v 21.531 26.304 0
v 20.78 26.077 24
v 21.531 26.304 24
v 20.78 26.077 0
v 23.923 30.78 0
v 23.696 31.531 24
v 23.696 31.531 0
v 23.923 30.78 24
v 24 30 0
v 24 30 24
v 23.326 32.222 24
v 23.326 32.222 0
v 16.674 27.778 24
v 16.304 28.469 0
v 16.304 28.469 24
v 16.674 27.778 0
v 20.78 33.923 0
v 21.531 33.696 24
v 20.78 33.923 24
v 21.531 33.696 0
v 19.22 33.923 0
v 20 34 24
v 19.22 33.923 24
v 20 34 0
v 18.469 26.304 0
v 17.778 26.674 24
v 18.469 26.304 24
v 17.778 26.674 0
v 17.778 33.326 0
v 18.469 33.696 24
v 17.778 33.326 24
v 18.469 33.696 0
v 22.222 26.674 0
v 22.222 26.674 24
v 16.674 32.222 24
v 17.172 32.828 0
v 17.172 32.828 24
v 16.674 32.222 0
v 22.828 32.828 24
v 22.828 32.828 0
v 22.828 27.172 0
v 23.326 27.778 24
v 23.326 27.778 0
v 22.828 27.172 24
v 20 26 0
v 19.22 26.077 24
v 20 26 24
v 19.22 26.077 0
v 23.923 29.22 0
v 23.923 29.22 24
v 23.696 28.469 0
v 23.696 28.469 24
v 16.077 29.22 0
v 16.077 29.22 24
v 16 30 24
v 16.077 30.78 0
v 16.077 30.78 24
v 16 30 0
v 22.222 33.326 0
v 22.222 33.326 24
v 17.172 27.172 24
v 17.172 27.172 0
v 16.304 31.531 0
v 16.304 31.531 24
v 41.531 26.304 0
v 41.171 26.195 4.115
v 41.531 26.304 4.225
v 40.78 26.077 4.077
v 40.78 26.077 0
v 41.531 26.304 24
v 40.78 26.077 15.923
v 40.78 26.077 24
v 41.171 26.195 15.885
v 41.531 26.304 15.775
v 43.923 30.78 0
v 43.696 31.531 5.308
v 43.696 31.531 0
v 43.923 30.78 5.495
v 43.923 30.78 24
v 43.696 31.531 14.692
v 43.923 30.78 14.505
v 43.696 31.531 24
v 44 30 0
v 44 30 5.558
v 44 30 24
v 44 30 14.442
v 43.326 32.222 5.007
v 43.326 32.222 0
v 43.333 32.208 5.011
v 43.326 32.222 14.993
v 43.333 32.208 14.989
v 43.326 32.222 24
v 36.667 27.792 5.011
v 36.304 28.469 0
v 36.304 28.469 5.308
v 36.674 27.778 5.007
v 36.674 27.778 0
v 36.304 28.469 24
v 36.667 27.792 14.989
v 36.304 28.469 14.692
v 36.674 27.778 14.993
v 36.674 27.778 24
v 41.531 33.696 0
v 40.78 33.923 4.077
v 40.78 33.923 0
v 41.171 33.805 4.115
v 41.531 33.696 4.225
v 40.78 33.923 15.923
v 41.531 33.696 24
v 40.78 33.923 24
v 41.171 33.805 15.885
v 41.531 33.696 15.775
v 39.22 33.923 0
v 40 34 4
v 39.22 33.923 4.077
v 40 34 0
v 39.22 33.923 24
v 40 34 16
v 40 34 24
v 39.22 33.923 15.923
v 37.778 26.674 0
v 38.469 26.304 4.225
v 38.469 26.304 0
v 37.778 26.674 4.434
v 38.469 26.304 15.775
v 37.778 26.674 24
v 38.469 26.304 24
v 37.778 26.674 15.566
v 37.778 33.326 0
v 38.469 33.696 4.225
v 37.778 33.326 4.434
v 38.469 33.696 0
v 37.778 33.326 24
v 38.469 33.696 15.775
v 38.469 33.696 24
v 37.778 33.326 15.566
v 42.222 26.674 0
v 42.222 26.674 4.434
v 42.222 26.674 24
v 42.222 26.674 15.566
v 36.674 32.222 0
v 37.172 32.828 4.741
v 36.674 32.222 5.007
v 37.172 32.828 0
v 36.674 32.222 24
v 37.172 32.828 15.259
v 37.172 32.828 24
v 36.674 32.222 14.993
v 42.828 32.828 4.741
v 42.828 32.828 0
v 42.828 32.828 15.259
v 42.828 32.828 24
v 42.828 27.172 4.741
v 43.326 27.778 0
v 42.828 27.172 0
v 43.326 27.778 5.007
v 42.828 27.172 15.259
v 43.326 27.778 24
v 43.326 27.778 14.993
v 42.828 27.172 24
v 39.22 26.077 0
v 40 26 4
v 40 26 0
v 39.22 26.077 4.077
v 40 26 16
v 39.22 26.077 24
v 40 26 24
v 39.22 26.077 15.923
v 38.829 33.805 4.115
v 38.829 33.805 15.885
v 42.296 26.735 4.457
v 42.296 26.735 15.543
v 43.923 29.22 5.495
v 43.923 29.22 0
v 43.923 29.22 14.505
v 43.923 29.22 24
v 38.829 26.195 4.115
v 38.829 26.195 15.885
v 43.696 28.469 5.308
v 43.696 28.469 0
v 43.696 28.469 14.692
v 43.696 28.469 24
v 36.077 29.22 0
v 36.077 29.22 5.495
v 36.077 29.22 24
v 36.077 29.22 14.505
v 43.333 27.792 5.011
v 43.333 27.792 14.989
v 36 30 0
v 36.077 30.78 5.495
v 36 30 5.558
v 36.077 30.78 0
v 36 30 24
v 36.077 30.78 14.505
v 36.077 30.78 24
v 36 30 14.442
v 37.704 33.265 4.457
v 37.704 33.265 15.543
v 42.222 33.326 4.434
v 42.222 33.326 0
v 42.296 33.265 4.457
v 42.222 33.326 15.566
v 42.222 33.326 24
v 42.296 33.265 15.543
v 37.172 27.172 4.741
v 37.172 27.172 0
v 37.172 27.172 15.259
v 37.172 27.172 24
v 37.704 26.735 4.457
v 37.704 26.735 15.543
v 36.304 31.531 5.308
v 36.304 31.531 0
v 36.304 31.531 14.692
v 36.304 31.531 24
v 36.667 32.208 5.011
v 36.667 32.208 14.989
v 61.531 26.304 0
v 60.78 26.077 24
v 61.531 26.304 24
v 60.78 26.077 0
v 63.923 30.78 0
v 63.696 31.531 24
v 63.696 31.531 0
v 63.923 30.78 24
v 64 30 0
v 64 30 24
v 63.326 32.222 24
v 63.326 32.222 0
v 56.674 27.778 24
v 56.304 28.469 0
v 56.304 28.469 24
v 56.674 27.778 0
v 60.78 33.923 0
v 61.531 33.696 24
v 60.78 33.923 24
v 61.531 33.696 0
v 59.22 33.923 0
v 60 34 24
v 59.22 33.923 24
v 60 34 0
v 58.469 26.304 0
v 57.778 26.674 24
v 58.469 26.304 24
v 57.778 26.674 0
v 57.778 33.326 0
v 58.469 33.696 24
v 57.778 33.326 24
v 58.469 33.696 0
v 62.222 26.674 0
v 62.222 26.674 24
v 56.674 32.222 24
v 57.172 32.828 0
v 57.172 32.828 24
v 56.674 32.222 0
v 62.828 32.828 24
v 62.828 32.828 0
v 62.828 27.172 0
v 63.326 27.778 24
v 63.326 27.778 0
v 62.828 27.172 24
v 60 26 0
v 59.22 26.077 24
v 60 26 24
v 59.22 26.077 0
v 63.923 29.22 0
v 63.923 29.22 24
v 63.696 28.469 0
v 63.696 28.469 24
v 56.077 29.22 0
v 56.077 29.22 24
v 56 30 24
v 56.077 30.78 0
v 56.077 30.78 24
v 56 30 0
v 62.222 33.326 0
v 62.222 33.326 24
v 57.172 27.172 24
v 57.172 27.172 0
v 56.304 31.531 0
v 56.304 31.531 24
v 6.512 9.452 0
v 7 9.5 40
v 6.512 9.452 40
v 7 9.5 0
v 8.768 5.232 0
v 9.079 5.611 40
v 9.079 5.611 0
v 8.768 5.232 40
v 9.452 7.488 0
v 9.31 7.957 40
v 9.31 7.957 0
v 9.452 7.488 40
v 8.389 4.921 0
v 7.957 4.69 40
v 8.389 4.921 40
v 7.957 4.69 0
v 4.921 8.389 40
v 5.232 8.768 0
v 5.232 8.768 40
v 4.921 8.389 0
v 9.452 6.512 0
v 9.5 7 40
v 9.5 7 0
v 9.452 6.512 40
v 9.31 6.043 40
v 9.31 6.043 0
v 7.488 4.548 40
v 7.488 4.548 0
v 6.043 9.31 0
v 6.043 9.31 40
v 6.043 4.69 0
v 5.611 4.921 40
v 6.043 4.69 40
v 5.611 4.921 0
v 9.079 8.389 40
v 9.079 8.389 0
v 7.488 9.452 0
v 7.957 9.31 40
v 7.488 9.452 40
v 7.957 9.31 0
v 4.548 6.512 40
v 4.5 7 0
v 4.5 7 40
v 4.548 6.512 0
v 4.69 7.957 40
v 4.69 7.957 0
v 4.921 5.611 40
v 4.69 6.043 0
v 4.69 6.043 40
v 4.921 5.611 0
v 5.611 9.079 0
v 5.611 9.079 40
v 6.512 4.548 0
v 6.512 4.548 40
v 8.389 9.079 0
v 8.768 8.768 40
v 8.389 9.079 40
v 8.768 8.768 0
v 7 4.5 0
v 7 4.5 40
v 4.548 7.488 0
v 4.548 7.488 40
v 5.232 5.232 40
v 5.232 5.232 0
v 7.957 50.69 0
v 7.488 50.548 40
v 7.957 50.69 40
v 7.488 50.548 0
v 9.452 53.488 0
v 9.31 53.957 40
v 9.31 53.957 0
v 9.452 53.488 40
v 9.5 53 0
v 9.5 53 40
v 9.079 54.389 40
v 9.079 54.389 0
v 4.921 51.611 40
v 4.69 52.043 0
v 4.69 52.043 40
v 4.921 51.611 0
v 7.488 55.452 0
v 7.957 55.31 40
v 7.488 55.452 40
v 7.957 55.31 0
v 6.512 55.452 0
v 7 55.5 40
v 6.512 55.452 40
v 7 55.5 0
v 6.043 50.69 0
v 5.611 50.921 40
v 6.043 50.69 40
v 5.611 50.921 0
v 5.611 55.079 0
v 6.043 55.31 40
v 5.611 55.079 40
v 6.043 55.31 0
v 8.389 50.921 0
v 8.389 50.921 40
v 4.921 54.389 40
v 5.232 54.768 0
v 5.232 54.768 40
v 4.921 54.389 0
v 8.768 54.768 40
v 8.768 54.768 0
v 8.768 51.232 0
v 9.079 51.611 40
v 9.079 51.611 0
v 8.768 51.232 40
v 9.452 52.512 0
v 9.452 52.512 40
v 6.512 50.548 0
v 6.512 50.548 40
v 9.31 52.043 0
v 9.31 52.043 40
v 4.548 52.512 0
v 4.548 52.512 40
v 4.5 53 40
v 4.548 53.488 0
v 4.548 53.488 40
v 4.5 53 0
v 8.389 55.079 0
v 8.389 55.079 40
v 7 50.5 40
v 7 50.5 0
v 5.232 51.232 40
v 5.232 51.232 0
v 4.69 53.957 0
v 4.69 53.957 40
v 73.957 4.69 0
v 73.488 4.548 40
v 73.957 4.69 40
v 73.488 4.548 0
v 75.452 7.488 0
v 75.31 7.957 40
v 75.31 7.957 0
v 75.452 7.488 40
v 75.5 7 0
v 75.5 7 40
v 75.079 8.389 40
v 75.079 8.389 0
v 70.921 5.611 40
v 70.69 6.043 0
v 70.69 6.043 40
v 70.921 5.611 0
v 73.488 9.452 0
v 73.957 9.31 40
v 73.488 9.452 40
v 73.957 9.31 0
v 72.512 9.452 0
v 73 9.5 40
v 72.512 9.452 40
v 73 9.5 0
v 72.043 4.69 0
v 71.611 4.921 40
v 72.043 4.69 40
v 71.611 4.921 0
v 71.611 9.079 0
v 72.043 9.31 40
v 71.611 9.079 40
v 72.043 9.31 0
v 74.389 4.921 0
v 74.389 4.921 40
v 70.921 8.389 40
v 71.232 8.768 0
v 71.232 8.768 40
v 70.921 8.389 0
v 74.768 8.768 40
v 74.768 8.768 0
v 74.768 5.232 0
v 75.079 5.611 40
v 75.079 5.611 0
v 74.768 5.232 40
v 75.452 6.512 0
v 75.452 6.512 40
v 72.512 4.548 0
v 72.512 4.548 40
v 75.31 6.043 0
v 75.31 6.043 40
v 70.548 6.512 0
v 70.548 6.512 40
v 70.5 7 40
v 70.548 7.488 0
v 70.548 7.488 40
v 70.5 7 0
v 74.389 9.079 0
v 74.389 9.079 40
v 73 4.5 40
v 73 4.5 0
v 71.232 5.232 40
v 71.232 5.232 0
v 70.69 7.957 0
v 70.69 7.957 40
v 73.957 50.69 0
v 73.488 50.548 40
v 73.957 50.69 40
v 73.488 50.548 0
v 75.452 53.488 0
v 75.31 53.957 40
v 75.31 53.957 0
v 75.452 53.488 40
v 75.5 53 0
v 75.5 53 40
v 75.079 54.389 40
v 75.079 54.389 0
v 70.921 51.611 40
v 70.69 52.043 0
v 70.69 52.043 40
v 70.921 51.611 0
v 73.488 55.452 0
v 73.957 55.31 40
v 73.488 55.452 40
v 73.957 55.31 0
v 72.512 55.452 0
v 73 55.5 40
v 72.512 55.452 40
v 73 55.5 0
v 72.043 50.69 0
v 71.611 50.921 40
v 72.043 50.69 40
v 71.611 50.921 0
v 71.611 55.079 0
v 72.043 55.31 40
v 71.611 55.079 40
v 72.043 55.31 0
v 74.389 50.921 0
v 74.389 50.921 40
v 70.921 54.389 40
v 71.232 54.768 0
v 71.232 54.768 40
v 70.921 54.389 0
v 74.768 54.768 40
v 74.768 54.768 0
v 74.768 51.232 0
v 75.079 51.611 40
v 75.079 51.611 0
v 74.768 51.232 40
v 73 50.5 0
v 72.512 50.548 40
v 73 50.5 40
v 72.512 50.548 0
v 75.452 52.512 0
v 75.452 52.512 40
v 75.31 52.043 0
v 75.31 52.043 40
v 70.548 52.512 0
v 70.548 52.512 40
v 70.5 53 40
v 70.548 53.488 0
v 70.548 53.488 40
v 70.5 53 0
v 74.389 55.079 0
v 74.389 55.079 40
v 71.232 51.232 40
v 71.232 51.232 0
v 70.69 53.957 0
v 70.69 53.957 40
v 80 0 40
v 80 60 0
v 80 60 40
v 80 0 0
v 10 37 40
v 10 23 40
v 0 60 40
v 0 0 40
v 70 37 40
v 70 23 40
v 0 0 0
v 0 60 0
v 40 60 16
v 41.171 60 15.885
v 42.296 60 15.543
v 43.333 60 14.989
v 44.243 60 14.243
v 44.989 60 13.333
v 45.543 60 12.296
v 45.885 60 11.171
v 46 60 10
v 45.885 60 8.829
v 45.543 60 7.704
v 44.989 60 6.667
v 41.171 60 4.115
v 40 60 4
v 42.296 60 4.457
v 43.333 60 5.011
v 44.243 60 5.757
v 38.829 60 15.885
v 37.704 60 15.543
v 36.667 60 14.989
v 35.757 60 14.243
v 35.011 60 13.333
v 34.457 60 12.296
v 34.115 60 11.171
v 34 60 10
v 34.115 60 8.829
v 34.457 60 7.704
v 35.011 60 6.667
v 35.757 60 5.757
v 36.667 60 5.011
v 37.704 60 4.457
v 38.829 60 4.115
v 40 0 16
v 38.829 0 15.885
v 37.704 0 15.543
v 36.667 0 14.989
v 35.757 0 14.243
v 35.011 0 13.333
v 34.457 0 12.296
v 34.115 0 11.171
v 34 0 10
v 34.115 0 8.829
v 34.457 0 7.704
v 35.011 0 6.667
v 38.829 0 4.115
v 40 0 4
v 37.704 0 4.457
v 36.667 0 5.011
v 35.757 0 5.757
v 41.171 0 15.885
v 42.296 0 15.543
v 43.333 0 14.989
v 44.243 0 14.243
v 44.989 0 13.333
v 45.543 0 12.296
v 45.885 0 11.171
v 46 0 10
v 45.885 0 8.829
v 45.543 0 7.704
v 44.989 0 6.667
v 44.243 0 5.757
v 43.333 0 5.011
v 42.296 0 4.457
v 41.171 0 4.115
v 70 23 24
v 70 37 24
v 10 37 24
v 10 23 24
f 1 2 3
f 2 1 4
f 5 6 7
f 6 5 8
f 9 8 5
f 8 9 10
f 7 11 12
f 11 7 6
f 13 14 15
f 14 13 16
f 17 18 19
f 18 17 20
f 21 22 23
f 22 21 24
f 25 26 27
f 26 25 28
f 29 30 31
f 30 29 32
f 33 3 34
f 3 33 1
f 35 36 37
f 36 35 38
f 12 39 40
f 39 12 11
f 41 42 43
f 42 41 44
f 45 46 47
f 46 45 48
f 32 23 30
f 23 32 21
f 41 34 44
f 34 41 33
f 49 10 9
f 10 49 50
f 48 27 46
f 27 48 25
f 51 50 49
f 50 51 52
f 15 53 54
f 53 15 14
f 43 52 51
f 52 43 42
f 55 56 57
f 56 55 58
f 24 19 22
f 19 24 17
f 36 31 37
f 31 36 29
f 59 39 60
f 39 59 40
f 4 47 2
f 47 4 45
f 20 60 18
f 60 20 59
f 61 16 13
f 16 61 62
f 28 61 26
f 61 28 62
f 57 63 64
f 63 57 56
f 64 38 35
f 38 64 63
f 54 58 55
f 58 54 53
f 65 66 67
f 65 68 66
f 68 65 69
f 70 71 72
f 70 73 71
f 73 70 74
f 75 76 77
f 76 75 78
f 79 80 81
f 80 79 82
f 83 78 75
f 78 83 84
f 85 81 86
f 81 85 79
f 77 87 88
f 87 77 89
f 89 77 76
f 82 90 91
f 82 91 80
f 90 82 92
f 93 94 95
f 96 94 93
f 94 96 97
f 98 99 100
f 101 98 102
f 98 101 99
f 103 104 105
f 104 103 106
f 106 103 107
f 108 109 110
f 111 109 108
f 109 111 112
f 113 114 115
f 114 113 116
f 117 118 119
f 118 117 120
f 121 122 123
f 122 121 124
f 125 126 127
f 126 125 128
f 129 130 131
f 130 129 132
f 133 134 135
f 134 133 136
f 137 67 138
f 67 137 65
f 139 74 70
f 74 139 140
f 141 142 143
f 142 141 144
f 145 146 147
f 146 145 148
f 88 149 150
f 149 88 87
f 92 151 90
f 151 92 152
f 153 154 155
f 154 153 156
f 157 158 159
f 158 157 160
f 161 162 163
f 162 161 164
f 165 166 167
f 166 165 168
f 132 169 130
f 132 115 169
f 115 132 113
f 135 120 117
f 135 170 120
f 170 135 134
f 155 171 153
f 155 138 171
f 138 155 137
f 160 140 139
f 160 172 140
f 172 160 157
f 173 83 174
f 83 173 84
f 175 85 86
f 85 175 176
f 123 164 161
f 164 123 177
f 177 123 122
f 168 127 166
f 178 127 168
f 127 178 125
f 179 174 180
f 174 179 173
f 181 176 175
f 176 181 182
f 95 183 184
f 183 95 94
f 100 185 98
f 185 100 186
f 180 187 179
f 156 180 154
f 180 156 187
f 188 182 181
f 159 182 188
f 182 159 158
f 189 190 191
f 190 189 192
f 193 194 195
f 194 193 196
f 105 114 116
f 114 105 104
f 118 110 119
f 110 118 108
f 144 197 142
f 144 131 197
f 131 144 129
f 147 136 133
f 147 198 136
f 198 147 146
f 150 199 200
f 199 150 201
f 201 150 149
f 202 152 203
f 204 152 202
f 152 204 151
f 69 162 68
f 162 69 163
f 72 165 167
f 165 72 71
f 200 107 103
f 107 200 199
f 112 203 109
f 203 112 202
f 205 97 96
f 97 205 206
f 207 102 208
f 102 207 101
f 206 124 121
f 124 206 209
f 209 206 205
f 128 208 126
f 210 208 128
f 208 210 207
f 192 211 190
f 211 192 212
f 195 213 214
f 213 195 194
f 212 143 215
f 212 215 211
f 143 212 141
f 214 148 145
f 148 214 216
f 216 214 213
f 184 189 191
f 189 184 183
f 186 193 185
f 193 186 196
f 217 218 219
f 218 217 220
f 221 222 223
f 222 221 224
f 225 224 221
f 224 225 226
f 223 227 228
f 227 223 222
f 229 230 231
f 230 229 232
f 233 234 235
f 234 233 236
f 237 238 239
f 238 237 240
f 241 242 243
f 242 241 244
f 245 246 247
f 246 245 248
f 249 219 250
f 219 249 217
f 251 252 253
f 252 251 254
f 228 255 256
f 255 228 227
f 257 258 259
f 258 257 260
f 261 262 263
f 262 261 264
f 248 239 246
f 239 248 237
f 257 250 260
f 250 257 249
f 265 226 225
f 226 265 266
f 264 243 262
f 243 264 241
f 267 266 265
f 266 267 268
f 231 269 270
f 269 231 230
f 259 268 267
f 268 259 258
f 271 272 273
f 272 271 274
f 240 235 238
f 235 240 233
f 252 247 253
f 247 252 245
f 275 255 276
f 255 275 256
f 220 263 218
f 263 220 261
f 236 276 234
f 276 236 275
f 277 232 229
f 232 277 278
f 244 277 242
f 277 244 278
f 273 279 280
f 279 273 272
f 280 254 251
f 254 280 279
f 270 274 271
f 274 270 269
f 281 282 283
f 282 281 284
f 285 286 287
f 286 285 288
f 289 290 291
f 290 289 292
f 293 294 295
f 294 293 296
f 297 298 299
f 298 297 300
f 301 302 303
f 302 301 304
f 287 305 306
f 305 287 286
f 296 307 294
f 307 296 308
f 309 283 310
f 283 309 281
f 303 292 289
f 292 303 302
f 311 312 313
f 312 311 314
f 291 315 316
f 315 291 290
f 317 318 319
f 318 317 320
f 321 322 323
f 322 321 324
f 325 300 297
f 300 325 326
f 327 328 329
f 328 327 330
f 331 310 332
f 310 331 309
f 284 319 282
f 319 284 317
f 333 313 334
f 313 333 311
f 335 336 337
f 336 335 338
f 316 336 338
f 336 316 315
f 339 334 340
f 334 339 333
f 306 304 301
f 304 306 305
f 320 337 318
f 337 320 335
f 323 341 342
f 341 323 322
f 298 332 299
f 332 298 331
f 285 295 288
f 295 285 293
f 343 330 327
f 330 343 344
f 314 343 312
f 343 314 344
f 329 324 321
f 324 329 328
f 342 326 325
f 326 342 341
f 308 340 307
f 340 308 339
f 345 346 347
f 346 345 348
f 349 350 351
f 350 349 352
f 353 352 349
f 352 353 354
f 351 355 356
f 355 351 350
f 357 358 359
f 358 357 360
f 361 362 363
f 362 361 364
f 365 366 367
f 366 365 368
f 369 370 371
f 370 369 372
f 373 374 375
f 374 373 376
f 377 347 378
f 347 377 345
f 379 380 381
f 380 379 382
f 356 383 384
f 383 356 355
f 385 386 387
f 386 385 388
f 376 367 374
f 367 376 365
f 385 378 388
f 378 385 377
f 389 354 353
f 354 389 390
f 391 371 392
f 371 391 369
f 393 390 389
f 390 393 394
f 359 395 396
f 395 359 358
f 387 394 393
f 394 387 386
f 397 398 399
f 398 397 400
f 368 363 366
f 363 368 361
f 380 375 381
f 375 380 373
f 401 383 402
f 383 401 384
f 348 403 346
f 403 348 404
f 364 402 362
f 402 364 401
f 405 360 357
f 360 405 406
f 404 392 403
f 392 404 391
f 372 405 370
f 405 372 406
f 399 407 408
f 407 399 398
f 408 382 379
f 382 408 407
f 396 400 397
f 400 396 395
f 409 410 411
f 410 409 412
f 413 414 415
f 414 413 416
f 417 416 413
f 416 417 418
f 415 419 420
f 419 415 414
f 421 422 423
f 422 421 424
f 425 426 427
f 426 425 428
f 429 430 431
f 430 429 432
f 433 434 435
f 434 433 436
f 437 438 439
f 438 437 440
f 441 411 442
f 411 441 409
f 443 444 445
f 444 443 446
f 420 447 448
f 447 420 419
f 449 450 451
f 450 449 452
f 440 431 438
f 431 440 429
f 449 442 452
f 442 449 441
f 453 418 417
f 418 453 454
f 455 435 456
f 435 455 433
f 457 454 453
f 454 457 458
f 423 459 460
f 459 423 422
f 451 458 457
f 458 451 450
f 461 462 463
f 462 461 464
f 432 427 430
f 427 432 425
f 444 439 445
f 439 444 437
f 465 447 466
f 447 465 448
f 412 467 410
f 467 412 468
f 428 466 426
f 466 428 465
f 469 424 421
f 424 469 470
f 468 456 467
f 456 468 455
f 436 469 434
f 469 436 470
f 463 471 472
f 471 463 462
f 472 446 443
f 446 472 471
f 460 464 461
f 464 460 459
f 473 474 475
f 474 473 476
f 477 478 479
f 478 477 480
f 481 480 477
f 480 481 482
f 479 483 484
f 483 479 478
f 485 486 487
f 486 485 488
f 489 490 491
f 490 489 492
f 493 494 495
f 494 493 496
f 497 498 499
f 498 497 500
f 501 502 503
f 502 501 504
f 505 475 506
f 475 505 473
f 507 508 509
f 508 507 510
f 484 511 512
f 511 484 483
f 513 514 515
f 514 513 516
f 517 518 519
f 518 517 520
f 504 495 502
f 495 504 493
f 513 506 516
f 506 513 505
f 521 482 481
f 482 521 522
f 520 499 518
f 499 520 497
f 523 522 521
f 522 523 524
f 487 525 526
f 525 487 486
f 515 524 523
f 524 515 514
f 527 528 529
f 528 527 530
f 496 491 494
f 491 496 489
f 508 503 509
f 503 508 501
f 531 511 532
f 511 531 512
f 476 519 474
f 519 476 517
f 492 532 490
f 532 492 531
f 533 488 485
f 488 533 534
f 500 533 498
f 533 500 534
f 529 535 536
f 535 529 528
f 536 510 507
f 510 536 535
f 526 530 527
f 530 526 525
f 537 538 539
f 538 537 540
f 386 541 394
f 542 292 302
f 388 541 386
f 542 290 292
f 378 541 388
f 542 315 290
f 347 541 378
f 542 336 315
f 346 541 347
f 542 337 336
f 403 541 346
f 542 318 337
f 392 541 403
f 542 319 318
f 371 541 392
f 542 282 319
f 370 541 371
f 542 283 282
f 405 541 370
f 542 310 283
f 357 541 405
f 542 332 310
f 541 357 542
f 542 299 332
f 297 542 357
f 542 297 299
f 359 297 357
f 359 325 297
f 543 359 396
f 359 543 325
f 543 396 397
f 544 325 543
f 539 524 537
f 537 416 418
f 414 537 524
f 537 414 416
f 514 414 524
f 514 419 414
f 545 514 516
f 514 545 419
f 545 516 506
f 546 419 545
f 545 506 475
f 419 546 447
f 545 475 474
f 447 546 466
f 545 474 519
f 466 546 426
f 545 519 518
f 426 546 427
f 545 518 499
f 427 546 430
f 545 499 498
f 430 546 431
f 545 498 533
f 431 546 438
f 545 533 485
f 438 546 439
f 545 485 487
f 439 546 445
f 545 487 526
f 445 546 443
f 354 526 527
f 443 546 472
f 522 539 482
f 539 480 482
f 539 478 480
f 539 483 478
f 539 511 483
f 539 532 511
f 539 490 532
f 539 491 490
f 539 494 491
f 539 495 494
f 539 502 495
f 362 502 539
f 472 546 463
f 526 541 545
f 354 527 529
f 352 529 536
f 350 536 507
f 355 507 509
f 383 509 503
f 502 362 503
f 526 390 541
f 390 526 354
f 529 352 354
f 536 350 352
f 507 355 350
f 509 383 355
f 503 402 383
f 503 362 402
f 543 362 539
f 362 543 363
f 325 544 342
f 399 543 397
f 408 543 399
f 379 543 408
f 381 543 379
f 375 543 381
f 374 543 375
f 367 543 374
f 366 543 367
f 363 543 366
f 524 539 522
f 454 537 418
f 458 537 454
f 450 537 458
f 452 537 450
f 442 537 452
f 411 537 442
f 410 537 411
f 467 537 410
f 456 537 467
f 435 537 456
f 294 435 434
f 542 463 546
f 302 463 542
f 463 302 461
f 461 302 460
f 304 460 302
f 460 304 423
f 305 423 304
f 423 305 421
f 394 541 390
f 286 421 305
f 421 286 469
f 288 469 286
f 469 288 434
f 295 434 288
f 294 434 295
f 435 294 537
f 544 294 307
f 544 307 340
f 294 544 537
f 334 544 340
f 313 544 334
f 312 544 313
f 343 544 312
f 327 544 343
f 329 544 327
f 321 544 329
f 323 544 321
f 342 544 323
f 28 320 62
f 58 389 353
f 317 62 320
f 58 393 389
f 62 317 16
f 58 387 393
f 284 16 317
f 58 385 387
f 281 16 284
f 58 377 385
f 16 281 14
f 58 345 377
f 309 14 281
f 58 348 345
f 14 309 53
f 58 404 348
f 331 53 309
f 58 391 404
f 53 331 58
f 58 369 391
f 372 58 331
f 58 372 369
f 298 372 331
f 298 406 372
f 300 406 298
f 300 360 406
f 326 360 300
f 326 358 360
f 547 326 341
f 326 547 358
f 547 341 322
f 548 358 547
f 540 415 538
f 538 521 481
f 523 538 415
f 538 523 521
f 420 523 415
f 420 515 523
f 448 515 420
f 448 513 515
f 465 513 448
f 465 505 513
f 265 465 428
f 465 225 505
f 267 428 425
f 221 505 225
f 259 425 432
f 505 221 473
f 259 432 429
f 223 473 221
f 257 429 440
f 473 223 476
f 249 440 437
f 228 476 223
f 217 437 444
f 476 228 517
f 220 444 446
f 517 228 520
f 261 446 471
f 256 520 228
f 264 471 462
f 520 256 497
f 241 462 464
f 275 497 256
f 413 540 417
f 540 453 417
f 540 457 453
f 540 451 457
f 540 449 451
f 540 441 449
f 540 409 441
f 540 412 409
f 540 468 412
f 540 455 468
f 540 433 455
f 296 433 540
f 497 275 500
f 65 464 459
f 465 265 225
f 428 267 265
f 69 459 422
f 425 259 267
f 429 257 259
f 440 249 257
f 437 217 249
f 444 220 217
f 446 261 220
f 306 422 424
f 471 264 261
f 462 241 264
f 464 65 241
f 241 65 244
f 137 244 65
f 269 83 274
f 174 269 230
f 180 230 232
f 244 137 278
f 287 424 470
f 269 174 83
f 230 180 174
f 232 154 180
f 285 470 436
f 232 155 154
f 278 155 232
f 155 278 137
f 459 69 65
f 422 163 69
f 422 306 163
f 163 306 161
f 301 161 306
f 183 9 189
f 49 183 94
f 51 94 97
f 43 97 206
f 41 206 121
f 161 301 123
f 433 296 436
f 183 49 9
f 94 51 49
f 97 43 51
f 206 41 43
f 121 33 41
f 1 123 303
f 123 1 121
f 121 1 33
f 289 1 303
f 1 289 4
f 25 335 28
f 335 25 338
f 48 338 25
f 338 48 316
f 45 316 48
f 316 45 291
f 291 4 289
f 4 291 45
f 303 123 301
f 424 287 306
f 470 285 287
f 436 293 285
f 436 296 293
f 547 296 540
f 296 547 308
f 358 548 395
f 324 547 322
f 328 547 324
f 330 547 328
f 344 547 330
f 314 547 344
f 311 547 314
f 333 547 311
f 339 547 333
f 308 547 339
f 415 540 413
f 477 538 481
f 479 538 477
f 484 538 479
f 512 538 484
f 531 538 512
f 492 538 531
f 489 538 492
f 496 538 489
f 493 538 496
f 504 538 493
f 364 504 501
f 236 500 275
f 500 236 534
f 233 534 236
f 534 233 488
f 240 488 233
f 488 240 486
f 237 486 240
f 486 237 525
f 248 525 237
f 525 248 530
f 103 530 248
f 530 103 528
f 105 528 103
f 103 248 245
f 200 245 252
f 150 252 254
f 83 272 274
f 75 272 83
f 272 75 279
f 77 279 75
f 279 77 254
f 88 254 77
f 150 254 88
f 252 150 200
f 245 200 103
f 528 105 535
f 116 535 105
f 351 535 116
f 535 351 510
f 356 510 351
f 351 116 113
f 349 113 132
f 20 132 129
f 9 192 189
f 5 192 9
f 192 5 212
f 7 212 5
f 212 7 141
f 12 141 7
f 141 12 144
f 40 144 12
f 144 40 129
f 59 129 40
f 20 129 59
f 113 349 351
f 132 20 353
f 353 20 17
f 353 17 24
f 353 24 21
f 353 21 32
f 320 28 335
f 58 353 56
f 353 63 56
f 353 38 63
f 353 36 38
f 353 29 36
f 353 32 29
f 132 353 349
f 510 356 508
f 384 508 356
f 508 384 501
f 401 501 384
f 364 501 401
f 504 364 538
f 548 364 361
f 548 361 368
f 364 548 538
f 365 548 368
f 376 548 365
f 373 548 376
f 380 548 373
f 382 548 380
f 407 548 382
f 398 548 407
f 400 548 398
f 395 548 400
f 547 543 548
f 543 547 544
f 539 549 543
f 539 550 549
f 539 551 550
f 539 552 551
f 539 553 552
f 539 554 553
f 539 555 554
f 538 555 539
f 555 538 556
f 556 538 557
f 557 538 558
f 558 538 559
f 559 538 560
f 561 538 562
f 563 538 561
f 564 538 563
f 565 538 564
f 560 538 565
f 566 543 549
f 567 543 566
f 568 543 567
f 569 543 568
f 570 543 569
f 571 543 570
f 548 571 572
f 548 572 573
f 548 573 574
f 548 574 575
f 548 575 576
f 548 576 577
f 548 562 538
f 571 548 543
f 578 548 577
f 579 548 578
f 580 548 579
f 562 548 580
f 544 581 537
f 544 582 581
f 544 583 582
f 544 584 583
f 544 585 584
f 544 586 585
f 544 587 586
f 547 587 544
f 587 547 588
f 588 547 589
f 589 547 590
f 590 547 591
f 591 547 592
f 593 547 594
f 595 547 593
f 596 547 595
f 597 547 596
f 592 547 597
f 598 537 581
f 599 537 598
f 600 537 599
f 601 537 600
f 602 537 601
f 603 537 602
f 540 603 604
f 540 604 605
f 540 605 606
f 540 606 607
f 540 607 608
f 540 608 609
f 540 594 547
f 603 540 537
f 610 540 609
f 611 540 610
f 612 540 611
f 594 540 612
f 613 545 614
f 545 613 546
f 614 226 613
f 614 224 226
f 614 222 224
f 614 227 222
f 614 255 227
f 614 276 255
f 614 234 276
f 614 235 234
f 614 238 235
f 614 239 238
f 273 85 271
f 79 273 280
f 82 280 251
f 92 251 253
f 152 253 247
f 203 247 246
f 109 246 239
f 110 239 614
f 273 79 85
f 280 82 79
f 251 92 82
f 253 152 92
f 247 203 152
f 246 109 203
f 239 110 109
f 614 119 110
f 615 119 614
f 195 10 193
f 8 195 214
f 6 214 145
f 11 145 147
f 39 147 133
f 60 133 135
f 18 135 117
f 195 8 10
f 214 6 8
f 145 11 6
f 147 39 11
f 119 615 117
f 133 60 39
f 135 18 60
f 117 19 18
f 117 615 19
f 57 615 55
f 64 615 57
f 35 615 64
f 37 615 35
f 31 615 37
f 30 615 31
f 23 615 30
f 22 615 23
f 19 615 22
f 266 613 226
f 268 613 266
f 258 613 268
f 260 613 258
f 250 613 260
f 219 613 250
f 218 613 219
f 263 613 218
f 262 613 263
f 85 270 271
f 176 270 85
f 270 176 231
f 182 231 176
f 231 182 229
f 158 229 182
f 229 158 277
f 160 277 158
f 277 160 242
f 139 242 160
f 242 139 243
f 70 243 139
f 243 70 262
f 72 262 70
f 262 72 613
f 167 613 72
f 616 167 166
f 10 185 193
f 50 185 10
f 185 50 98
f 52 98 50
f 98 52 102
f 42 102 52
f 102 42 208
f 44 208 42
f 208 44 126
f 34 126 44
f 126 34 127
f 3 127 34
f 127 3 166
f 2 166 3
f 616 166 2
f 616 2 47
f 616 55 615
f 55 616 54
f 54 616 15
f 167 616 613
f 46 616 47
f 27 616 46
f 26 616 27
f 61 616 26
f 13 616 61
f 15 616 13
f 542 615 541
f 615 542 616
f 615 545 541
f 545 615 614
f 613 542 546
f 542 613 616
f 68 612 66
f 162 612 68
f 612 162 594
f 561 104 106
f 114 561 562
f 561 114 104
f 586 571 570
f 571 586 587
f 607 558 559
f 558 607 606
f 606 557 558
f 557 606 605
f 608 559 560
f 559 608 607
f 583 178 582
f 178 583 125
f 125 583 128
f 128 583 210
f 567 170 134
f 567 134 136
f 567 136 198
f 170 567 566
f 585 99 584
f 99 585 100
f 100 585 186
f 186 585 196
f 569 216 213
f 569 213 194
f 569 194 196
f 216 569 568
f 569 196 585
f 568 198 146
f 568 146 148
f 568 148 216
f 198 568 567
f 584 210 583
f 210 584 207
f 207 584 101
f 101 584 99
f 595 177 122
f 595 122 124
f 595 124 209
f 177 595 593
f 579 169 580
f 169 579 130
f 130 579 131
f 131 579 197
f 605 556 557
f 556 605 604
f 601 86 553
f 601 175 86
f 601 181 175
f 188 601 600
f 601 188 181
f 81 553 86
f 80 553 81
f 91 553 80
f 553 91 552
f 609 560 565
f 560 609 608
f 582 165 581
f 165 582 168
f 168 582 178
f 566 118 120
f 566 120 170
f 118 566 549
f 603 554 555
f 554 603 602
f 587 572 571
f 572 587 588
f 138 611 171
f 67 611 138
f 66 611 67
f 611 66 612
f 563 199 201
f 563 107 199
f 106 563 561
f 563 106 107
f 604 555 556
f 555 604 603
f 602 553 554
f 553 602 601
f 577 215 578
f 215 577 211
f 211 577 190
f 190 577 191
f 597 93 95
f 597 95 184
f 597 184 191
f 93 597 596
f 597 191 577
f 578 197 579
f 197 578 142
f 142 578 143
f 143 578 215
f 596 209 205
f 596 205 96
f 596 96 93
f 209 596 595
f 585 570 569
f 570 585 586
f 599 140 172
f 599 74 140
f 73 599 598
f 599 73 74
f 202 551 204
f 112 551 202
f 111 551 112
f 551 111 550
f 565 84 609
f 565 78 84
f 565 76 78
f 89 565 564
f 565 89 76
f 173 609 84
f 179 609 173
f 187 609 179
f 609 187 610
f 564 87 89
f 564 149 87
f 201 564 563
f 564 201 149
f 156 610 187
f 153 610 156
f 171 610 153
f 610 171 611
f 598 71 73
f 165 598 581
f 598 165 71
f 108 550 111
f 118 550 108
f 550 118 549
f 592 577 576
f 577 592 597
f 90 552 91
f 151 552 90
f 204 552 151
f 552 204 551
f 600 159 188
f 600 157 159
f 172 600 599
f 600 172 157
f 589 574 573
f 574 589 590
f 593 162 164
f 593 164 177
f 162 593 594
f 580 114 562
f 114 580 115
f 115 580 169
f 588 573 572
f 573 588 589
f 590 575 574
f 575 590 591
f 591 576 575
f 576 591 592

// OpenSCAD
$fn = 32;

// ----------------------------------------------------------------------
// Manifold block: side_outlet manifold
// ----------------------------------------------------------------------

// --- parameters (mm) ---
block_l = 80;             // block length, X
block_w = 60;             // block width, Y
block_h = 40;             // block height, Z
port_d = 8;               // port bore diameter
port_pitch = 20;          // port pitch along X
gallery_d = 14;           // top gallery width, Y
gallery_depth = 16;       // gallery pocket depth
wall_p = 10;              // gallery end wall thickness, X
mnt_d = 5;                // mounting hole diameter
mnt_in = 7;               // mounting hole inset from the edges
out_d = 12;               // outlet bore diameter
out_z = 10;               // outlet axis height

n_ports = 3;  // ports in the row
port_x0 = (block_l - (n_ports - 1) * port_pitch) / 2;  // first port X

difference() {
  cube([block_l, block_w, block_h]);
  for (i = [0 : n_ports - 1])
    translate([port_x0 + i * port_pitch, block_w / 2, -1])
      cylinder(h = block_h + 2, d = port_d);
  translate([wall_p, block_w / 2 - gallery_d / 2, block_h - gallery_depth])
    cube([block_l - 2 * wall_p, gallery_d, gallery_depth + 1]);
  for (cx = [mnt_in, block_l - mnt_in])
    for (cy = [mnt_in, block_w - mnt_in])
      translate([cx, cy, -1]) cylinder(h = block_h + 2, d = mnt_d);
  translate([block_l / 2, -1, out_z]) rotate([-90, 0, 0])
    cylinder(h = block_w + 2, d = out_d);
}
